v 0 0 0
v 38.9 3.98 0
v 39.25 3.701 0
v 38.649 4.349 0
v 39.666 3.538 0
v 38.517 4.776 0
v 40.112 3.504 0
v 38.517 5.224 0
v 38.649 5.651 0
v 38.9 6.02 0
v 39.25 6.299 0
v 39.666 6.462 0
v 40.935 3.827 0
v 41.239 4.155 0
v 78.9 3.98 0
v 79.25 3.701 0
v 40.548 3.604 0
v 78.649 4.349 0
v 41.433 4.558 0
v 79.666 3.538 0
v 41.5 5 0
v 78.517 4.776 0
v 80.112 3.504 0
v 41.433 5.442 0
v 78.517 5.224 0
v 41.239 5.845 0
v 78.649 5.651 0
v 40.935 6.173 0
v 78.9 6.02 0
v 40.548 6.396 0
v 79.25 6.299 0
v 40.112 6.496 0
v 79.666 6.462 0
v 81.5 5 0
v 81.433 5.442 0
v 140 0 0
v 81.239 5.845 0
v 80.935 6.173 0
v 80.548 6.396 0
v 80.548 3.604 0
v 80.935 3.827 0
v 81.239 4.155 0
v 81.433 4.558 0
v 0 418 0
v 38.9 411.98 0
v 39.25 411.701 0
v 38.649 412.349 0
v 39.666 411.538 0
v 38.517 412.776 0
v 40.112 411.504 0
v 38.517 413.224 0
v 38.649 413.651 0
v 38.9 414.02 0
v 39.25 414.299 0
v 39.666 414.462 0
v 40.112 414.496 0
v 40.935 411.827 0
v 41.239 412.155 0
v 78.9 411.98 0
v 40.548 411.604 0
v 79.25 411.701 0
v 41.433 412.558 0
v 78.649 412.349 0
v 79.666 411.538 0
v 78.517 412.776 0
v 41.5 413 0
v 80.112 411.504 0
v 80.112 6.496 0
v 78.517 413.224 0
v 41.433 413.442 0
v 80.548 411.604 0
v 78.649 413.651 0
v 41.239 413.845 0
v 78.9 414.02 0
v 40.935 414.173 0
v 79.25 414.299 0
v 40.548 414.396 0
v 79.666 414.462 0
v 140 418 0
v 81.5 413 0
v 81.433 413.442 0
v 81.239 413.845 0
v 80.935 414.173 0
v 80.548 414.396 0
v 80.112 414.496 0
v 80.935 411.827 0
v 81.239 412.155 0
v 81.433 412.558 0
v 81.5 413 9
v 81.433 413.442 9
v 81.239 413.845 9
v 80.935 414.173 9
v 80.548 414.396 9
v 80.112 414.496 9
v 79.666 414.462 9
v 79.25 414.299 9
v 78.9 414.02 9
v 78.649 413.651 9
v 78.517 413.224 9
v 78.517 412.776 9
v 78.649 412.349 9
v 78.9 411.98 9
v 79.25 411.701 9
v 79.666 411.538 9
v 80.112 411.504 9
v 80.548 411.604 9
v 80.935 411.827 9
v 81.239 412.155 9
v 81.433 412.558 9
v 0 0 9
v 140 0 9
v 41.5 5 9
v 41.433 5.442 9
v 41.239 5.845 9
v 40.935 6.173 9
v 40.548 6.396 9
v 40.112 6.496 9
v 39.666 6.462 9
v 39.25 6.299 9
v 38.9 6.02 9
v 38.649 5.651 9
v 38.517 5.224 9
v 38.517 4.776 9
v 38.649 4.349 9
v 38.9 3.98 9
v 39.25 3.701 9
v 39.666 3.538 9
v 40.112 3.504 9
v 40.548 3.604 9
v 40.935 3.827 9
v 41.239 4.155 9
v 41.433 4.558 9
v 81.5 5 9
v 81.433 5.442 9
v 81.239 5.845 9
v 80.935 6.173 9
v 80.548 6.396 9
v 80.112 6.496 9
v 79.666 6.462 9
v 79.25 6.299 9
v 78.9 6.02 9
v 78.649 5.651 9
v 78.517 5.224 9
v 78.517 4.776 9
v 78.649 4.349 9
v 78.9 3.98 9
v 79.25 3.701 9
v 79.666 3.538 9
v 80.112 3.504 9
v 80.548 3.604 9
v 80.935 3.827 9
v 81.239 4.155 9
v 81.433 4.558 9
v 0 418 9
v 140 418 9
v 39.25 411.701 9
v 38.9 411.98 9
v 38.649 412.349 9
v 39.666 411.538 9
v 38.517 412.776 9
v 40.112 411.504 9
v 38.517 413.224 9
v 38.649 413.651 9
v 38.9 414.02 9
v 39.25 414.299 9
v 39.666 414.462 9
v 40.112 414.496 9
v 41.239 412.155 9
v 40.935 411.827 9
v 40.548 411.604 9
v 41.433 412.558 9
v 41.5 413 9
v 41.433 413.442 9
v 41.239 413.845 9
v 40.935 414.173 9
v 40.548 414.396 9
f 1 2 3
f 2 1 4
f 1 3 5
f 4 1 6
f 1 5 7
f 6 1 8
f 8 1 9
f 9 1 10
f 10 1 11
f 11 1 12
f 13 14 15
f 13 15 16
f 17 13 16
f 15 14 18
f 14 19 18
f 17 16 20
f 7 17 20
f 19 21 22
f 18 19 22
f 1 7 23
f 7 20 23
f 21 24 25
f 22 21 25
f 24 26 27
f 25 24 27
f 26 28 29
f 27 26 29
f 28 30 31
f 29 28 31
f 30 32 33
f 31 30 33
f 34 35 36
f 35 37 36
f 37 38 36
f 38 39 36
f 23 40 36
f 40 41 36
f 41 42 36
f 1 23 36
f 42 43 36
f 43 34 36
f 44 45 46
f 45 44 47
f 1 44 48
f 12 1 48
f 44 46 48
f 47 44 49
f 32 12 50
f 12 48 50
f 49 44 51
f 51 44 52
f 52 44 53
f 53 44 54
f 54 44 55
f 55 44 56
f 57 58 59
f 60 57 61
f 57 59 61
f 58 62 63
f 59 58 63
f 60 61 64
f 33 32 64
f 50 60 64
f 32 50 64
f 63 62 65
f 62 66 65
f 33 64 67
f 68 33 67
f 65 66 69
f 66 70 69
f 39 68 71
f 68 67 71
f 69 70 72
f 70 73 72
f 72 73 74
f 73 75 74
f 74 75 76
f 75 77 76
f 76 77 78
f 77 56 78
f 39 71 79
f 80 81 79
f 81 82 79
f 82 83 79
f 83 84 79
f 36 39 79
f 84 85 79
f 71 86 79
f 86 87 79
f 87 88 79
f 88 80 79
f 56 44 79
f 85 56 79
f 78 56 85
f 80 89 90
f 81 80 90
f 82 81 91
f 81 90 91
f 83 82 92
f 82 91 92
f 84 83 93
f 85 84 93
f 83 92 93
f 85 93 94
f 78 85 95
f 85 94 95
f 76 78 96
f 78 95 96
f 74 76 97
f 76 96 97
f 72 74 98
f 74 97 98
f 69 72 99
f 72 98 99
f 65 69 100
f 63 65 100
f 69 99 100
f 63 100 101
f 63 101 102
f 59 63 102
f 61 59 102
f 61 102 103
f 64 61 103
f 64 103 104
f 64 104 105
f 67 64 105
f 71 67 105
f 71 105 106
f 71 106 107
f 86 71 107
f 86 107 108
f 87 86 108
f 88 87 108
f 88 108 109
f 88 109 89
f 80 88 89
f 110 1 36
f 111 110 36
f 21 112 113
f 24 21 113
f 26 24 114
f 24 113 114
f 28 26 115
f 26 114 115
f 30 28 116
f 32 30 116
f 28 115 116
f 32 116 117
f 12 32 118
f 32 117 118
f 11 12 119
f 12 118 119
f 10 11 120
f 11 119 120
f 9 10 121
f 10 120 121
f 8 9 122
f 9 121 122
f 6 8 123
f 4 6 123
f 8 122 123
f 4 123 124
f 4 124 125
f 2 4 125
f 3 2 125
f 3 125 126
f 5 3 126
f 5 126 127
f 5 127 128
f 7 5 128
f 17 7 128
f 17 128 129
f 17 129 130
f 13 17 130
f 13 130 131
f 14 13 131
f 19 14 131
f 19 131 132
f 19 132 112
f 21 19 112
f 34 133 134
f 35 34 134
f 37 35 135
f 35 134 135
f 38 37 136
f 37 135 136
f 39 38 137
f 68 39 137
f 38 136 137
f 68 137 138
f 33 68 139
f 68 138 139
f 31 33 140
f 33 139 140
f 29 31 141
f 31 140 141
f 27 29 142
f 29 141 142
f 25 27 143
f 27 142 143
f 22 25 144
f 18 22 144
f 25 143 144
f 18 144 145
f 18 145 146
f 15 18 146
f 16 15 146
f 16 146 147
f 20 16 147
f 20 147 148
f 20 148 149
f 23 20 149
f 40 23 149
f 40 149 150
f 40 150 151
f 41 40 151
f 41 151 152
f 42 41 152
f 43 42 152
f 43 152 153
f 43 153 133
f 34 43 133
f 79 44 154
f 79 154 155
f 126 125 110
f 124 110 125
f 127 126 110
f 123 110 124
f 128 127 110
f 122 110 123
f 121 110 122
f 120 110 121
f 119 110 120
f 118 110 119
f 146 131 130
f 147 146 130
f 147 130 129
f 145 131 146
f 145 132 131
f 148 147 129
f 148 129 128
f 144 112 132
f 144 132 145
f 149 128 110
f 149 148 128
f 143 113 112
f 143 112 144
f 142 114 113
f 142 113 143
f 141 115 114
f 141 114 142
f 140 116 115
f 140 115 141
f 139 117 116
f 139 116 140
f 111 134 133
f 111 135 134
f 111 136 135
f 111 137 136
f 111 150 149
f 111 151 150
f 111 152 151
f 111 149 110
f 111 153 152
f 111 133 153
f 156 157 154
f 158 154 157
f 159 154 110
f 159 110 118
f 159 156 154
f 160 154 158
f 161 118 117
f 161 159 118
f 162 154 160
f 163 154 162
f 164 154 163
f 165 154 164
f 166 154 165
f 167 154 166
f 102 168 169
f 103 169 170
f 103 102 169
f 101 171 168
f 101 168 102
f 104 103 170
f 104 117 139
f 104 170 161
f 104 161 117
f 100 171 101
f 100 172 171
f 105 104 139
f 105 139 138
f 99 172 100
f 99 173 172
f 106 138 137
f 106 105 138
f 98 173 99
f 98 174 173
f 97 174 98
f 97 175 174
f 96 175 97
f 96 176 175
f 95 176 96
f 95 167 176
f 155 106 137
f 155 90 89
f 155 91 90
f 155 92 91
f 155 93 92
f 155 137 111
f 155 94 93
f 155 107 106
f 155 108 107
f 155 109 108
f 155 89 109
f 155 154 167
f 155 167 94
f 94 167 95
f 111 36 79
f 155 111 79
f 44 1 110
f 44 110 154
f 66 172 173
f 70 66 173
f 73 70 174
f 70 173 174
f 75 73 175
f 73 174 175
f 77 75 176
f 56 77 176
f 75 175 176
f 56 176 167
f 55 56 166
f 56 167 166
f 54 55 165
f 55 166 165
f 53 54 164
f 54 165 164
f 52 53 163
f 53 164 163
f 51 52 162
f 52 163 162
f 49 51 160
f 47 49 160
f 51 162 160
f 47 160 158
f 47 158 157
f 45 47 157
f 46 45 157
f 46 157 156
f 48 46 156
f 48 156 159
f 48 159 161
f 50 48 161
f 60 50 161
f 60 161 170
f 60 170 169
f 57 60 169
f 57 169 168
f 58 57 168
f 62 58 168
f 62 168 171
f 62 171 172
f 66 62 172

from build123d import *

# Parameters (mm, degrees)
SKETCH_W    = 140
SKETCH_H    = 418
PAD_DEPTH   = 9
SKETCH001_R = 1.5
HOLE_DEPTH  = 9.001


with BuildPart() as part:
    # Sketch → Pad (new body)
    with BuildSketch(Plane.XY):
        with Locations((70, 209)):
            Rectangle(SKETCH_W, SKETCH_H)
    extrude(amount=PAD_DEPTH)

    # Sketch001 (on Face6 of Pad) → Hole (cut, through all)
    with BuildSketch(Plane.XY.offset(9)):
        with Locations((40, 5)):
            Circle(SKETCH001_R)
        with Locations((80, 5)):
            Circle(SKETCH001_R)
        with Locations((145, 100)):
            Circle(SKETCH001_R)
        with Locations((145, 300)):
            Circle(SKETCH001_R)
        with Locations((40, 413)):
            Circle(SKETCH001_R)
        with Locations((80, 413)):
            Circle(SKETCH001_R)
        with Locations((145, 200)):
            Circle(SKETCH001_R)
    extrude(amount=-HOLE_DEPTH, mode=Mode.SUBTRACT)


solid = part.part
